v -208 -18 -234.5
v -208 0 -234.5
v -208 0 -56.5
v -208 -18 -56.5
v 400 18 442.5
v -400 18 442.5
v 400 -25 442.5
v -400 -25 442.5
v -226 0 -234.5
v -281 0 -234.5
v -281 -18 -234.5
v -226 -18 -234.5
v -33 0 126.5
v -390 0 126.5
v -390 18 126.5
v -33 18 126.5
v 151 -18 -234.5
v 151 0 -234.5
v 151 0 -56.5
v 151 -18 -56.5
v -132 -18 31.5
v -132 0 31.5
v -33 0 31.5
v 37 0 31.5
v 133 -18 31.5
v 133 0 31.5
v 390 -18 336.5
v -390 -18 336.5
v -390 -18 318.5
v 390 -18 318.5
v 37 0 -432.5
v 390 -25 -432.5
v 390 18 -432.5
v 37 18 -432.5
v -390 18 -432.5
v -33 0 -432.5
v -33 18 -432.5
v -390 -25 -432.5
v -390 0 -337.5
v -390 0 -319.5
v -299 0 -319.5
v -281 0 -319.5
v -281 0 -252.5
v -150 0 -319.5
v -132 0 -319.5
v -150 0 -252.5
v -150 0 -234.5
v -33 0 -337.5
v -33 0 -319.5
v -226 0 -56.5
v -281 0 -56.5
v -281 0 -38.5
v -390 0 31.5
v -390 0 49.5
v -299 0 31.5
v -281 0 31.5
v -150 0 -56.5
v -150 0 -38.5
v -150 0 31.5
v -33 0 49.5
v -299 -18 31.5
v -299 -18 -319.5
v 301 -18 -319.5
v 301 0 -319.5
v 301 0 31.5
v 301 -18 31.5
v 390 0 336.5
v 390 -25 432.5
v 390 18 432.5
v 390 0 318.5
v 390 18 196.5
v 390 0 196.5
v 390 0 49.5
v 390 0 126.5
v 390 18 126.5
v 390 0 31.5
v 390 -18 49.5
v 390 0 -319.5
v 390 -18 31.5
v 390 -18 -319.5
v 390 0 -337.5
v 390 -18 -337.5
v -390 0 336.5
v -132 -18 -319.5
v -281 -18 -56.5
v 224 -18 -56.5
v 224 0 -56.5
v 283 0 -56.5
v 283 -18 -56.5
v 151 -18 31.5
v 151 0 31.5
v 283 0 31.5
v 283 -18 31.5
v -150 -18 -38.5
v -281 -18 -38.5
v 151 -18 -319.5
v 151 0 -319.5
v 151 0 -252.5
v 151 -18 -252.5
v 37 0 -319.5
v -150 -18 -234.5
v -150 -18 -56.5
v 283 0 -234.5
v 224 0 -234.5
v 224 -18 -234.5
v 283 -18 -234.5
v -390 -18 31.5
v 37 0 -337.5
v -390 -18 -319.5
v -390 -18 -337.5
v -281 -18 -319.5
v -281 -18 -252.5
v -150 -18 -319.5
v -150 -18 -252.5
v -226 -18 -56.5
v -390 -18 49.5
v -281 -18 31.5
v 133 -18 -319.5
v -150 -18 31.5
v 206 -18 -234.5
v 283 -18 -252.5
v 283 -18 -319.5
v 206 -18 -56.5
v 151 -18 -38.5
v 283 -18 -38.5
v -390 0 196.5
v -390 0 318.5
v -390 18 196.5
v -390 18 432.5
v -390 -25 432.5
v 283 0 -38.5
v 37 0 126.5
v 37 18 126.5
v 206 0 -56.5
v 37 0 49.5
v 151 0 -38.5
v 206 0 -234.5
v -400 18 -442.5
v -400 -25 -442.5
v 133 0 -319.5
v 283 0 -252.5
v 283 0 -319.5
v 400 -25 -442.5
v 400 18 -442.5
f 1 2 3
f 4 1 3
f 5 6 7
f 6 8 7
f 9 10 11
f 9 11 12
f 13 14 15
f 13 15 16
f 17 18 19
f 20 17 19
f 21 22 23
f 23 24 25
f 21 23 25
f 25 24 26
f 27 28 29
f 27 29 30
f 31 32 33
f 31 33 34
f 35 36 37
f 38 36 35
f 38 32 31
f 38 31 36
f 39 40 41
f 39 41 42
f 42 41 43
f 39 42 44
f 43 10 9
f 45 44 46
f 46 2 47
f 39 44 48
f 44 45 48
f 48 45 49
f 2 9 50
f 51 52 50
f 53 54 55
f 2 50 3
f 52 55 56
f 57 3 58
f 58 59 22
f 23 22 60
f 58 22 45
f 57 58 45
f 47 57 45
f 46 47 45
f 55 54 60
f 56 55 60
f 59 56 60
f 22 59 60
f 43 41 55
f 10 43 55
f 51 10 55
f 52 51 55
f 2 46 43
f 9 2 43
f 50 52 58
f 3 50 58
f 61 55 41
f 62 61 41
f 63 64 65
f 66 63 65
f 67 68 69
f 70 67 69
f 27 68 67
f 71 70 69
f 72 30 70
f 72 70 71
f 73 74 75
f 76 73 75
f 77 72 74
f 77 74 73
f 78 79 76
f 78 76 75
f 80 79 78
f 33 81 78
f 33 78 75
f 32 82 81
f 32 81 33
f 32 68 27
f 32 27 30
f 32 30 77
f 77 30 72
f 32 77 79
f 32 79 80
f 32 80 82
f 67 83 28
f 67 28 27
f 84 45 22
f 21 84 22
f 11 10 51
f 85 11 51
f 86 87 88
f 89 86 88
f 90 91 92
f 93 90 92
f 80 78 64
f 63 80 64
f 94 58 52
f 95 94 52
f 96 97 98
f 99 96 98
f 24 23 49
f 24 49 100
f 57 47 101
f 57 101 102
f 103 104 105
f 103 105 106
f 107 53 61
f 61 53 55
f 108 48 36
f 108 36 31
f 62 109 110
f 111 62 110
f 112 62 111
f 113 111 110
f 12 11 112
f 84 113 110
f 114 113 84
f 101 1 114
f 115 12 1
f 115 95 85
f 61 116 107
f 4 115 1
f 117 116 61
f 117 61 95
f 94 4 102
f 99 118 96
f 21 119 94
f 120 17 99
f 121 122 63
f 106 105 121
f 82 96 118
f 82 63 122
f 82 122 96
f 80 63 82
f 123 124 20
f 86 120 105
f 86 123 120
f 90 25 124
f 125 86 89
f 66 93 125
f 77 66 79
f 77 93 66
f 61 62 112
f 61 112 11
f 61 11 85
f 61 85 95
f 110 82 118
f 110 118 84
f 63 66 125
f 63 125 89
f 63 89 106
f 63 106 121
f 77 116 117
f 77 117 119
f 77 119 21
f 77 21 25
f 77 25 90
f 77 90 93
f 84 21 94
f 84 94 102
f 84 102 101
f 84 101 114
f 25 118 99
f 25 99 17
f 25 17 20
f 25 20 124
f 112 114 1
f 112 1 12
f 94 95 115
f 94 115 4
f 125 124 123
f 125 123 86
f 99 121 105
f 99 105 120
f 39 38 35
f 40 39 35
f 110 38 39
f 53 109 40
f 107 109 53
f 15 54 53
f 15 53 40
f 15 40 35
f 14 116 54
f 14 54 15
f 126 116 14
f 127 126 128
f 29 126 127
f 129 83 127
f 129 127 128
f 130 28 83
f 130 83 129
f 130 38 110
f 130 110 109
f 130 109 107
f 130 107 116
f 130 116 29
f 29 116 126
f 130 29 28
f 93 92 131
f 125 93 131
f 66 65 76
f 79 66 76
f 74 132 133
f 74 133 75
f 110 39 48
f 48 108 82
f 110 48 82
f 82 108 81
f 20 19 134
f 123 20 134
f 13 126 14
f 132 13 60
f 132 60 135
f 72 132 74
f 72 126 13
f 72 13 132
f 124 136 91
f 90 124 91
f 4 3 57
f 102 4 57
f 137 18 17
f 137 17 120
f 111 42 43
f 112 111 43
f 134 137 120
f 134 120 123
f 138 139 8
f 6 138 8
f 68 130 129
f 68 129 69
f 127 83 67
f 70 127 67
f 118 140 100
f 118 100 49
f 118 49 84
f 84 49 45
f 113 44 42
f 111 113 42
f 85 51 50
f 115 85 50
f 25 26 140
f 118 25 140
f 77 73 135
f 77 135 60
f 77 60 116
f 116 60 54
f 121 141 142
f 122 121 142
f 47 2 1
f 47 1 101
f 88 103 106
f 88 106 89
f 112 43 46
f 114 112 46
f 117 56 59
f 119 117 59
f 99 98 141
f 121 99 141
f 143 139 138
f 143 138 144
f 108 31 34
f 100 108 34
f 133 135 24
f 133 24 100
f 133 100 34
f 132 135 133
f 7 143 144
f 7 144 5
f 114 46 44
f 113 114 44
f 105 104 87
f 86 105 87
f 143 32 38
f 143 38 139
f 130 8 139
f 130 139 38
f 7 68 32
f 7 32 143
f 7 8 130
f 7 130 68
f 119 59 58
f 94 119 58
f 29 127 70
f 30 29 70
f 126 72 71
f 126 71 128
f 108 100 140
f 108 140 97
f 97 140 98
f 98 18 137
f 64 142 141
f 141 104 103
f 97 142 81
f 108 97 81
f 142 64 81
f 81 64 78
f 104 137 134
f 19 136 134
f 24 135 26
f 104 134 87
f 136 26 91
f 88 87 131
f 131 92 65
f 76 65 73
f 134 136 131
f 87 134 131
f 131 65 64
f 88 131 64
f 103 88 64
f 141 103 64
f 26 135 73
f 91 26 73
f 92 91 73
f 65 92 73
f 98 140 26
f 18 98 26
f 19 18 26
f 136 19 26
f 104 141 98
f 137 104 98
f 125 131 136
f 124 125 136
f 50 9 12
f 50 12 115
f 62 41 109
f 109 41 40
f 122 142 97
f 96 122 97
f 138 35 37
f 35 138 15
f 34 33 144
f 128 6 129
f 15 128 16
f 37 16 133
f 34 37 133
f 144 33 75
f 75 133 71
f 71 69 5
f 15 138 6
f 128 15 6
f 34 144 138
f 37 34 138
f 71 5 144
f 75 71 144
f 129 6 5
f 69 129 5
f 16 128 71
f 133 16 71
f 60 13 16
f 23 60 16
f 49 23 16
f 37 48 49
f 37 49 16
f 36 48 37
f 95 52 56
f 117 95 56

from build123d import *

# Parameters (mm, degrees)
F0_W     = 55
F0_H     = 178
F0_W_2   = 58
F0_W_3   = 59
F0_W_4   = 70
F0_H_2   = 18
F1_DEPTH = 18
F0_W_5   = 780
F0_W_6   = 800
F0_H_3   = 885
F2_DEPTH = 25
F0_W_7   = 357
F0_H_4   = 70
F0_W_8   = 353
F0_H_5   = 351
F0_H_6   = 95
F0_H_7   = 77
F3_DEPTH = 18


# Not quite as in the source:
# - a feature names something its author has since deleted; it is built from what else it names


with BuildPart() as f1:
    # F0 (on Front) → F1 (new body)
    with BuildSketch(Plane.XZ):
        Polygon((-299, 49.5), (-390, 49.5), (-390, 40.5200137198), (-390, 31.5), (-299, 31.5), (-299, -38.5), (-299, -56.5), (-299, -234.5), (-299, -252.5), (-299, -319.5), (-390, -319.5), (-390, -337.5), (-299, -337.5), (-281, -337.5), (-150, -337.5), (-132, -337.5), (-33, -337.5), (-33, -319.5), (-132, -319.5), (-132, -252.5), (-132, -234.5), (-132, -56.5), (-132, -38.5), (-132, 31.5), (-33, 31.5), (-33, 49.5), (-132, 49.5), (-150, 49.5), (-281, 49.5), align=None)
        Polygon((-226, -252.5), (-208, -252.5), (-150, -252.5), (-150, -319.5), (-281, -319.5), (-281, -252.5), align=None, mode=Mode.SUBTRACT)
        with Locations((-253.5, -145.5)):
            Rectangle(F0_W, F0_H, mode=Mode.SUBTRACT)
        Polygon((-281, 31.5), (-150, 31.5), (-150, -38.5), (-208, -38.5), (-226, -38.5), (-281, -38.5), align=None, mode=Mode.SUBTRACT)
        with Locations((-179, -145.5)):
            Rectangle(F0_W_2, F0_H, mode=Mode.SUBTRACT)
        Polygon((390, 40.5200137198), (390, 49.5), (301, 49.5), (283, 49.5), (151, 49.5), (133, 49.5), (37, 49.5), (37, 31.5), (133, 31.5), (133, -38.5), (133, -56.5), (133, -234.5), (133, -252.5), (133, -319.5), (37, -319.5), (37, -337.5), (133, -337.5), (151, -337.5), (283, -337.5), (301, -337.5), (390, -337.5), (390, -319.5), (301, -319.5), (301, -252.5), (301, -234.5), (301, -56.5), (301, -38.5), (301, 31.5), (390, 31.5), align=None)
        Polygon((206, -252.5), (224, -252.5), (283, -252.5), (283, -319.5), (151, -319.5), (151, -252.5), align=None, mode=Mode.SUBTRACT)
        with Locations((178.5, -145.5)):
            Rectangle(F0_W, F0_H, mode=Mode.SUBTRACT)
        with Locations((253.5, -145.5)):
            Rectangle(F0_W_3, F0_H, mode=Mode.SUBTRACT)
        Polygon((151, 31.5), (283, 31.5), (283, -38.5), (224, -38.5), (206, -38.5), (151, -38.5), align=None, mode=Mode.SUBTRACT)
        with Locations((2, 40.5)):
            Rectangle(F0_W_4, F0_H_2)
        with Locations((2, -328.5)):
            Rectangle(F0_W_4, F0_H_2)
    extrude(amount=F1_DEPTH)



with BuildPart() as f1b:
    # F0 (on Front) → F1, piece 2 (new body)
    with BuildSketch(Plane.XZ):
        with Locations((0, 327.5)):
            Rectangle(F0_W_5, F0_H_2)
    extrude(amount=F1_DEPTH)


with BuildPart() as f1_1:
    add(f1.part)

    add(f1b.part)  # F2 merges F1b
    # F0 (on Front) → F2 (join)
    with BuildSketch(Plane.XZ):
        Rectangle(F0_W_6, F0_H_3)
        Polygon((-390, 432.5), (390, 432.5), (390, 336.5), (390, 318.5), (390, 196.5), (390, 126.5), (390, 49.5), (390, 40.5200137198), (390, 31.5), (390, -38.5), (390, -56.5), (390, -234.5), (390, -252.5), (390, -319.5), (390, -337.5), (390, -432.5), (37, -432.5), (-33, -432.5), (-390, -432.5), (-390, -337.5), (-390, -319.5), (-390, -252.5), (-390, -234.5), (-390, -140.5), (-390, -56.5), (-390, -38.5), (-390, 31.5), (-390, 40.5200137198), (-390, 49.5), (-390, 126.5), (-390, 196.5), (-390, 318.5), (-390, 336.5), align=None, mode=Mode.SUBTRACT)
    extrude(amount=F2_DEPTH)

    # F0 (on Front) → F3 (join)
    with BuildSketch(Plane.XZ):
        Rectangle(F0_W_6, F0_H_3)
        Polygon((-390, 432.5), (390, 432.5), (390, 336.5), (390, 318.5), (390, 196.5), (390, 126.5), (390, 49.5), (390, 40.5200137198), (390, 31.5), (390, -38.5), (390, -56.5), (390, -234.5), (390, -252.5), (390, -319.5), (390, -337.5), (390, -432.5), (37, -432.5), (-33, -432.5), (-390, -432.5), (-390, -337.5), (-390, -319.5), (-390, -252.5), (-390, -234.5), (-390, -140.5), (-390, -56.5), (-390, -38.5), (-390, 31.5), (-390, 40.5200137198), (-390, 49.5), (-390, 126.5), (-390, 196.5), (-390, 318.5), (-390, 336.5), align=None, mode=Mode.SUBTRACT)
        with Locations((-211.5, 161.5)):
            Rectangle(F0_W_7, F0_H_4)
        with Locations((213.5, 161.5)):
            Rectangle(F0_W_8, F0_H_4)
        with Locations((2, -144)):
            Rectangle(F0_W_4, F0_H_5)
        with Locations((2, -385)):
            Rectangle(F0_W_4, F0_H_6)
        with Locations((2, 88)):
            Rectangle(F0_W_4, F0_H_7)
        with Locations((2, 161.5)):
            Rectangle(F0_W_4, F0_H_4)
        with Locations((2, 40.5)):
            Rectangle(F0_W_4, F0_H_2)
        with Locations((2, -328.5)):
            Rectangle(F0_W_4, F0_H_2)
    extrude(amount=-F3_DEPTH)


solid = f1_1.part
